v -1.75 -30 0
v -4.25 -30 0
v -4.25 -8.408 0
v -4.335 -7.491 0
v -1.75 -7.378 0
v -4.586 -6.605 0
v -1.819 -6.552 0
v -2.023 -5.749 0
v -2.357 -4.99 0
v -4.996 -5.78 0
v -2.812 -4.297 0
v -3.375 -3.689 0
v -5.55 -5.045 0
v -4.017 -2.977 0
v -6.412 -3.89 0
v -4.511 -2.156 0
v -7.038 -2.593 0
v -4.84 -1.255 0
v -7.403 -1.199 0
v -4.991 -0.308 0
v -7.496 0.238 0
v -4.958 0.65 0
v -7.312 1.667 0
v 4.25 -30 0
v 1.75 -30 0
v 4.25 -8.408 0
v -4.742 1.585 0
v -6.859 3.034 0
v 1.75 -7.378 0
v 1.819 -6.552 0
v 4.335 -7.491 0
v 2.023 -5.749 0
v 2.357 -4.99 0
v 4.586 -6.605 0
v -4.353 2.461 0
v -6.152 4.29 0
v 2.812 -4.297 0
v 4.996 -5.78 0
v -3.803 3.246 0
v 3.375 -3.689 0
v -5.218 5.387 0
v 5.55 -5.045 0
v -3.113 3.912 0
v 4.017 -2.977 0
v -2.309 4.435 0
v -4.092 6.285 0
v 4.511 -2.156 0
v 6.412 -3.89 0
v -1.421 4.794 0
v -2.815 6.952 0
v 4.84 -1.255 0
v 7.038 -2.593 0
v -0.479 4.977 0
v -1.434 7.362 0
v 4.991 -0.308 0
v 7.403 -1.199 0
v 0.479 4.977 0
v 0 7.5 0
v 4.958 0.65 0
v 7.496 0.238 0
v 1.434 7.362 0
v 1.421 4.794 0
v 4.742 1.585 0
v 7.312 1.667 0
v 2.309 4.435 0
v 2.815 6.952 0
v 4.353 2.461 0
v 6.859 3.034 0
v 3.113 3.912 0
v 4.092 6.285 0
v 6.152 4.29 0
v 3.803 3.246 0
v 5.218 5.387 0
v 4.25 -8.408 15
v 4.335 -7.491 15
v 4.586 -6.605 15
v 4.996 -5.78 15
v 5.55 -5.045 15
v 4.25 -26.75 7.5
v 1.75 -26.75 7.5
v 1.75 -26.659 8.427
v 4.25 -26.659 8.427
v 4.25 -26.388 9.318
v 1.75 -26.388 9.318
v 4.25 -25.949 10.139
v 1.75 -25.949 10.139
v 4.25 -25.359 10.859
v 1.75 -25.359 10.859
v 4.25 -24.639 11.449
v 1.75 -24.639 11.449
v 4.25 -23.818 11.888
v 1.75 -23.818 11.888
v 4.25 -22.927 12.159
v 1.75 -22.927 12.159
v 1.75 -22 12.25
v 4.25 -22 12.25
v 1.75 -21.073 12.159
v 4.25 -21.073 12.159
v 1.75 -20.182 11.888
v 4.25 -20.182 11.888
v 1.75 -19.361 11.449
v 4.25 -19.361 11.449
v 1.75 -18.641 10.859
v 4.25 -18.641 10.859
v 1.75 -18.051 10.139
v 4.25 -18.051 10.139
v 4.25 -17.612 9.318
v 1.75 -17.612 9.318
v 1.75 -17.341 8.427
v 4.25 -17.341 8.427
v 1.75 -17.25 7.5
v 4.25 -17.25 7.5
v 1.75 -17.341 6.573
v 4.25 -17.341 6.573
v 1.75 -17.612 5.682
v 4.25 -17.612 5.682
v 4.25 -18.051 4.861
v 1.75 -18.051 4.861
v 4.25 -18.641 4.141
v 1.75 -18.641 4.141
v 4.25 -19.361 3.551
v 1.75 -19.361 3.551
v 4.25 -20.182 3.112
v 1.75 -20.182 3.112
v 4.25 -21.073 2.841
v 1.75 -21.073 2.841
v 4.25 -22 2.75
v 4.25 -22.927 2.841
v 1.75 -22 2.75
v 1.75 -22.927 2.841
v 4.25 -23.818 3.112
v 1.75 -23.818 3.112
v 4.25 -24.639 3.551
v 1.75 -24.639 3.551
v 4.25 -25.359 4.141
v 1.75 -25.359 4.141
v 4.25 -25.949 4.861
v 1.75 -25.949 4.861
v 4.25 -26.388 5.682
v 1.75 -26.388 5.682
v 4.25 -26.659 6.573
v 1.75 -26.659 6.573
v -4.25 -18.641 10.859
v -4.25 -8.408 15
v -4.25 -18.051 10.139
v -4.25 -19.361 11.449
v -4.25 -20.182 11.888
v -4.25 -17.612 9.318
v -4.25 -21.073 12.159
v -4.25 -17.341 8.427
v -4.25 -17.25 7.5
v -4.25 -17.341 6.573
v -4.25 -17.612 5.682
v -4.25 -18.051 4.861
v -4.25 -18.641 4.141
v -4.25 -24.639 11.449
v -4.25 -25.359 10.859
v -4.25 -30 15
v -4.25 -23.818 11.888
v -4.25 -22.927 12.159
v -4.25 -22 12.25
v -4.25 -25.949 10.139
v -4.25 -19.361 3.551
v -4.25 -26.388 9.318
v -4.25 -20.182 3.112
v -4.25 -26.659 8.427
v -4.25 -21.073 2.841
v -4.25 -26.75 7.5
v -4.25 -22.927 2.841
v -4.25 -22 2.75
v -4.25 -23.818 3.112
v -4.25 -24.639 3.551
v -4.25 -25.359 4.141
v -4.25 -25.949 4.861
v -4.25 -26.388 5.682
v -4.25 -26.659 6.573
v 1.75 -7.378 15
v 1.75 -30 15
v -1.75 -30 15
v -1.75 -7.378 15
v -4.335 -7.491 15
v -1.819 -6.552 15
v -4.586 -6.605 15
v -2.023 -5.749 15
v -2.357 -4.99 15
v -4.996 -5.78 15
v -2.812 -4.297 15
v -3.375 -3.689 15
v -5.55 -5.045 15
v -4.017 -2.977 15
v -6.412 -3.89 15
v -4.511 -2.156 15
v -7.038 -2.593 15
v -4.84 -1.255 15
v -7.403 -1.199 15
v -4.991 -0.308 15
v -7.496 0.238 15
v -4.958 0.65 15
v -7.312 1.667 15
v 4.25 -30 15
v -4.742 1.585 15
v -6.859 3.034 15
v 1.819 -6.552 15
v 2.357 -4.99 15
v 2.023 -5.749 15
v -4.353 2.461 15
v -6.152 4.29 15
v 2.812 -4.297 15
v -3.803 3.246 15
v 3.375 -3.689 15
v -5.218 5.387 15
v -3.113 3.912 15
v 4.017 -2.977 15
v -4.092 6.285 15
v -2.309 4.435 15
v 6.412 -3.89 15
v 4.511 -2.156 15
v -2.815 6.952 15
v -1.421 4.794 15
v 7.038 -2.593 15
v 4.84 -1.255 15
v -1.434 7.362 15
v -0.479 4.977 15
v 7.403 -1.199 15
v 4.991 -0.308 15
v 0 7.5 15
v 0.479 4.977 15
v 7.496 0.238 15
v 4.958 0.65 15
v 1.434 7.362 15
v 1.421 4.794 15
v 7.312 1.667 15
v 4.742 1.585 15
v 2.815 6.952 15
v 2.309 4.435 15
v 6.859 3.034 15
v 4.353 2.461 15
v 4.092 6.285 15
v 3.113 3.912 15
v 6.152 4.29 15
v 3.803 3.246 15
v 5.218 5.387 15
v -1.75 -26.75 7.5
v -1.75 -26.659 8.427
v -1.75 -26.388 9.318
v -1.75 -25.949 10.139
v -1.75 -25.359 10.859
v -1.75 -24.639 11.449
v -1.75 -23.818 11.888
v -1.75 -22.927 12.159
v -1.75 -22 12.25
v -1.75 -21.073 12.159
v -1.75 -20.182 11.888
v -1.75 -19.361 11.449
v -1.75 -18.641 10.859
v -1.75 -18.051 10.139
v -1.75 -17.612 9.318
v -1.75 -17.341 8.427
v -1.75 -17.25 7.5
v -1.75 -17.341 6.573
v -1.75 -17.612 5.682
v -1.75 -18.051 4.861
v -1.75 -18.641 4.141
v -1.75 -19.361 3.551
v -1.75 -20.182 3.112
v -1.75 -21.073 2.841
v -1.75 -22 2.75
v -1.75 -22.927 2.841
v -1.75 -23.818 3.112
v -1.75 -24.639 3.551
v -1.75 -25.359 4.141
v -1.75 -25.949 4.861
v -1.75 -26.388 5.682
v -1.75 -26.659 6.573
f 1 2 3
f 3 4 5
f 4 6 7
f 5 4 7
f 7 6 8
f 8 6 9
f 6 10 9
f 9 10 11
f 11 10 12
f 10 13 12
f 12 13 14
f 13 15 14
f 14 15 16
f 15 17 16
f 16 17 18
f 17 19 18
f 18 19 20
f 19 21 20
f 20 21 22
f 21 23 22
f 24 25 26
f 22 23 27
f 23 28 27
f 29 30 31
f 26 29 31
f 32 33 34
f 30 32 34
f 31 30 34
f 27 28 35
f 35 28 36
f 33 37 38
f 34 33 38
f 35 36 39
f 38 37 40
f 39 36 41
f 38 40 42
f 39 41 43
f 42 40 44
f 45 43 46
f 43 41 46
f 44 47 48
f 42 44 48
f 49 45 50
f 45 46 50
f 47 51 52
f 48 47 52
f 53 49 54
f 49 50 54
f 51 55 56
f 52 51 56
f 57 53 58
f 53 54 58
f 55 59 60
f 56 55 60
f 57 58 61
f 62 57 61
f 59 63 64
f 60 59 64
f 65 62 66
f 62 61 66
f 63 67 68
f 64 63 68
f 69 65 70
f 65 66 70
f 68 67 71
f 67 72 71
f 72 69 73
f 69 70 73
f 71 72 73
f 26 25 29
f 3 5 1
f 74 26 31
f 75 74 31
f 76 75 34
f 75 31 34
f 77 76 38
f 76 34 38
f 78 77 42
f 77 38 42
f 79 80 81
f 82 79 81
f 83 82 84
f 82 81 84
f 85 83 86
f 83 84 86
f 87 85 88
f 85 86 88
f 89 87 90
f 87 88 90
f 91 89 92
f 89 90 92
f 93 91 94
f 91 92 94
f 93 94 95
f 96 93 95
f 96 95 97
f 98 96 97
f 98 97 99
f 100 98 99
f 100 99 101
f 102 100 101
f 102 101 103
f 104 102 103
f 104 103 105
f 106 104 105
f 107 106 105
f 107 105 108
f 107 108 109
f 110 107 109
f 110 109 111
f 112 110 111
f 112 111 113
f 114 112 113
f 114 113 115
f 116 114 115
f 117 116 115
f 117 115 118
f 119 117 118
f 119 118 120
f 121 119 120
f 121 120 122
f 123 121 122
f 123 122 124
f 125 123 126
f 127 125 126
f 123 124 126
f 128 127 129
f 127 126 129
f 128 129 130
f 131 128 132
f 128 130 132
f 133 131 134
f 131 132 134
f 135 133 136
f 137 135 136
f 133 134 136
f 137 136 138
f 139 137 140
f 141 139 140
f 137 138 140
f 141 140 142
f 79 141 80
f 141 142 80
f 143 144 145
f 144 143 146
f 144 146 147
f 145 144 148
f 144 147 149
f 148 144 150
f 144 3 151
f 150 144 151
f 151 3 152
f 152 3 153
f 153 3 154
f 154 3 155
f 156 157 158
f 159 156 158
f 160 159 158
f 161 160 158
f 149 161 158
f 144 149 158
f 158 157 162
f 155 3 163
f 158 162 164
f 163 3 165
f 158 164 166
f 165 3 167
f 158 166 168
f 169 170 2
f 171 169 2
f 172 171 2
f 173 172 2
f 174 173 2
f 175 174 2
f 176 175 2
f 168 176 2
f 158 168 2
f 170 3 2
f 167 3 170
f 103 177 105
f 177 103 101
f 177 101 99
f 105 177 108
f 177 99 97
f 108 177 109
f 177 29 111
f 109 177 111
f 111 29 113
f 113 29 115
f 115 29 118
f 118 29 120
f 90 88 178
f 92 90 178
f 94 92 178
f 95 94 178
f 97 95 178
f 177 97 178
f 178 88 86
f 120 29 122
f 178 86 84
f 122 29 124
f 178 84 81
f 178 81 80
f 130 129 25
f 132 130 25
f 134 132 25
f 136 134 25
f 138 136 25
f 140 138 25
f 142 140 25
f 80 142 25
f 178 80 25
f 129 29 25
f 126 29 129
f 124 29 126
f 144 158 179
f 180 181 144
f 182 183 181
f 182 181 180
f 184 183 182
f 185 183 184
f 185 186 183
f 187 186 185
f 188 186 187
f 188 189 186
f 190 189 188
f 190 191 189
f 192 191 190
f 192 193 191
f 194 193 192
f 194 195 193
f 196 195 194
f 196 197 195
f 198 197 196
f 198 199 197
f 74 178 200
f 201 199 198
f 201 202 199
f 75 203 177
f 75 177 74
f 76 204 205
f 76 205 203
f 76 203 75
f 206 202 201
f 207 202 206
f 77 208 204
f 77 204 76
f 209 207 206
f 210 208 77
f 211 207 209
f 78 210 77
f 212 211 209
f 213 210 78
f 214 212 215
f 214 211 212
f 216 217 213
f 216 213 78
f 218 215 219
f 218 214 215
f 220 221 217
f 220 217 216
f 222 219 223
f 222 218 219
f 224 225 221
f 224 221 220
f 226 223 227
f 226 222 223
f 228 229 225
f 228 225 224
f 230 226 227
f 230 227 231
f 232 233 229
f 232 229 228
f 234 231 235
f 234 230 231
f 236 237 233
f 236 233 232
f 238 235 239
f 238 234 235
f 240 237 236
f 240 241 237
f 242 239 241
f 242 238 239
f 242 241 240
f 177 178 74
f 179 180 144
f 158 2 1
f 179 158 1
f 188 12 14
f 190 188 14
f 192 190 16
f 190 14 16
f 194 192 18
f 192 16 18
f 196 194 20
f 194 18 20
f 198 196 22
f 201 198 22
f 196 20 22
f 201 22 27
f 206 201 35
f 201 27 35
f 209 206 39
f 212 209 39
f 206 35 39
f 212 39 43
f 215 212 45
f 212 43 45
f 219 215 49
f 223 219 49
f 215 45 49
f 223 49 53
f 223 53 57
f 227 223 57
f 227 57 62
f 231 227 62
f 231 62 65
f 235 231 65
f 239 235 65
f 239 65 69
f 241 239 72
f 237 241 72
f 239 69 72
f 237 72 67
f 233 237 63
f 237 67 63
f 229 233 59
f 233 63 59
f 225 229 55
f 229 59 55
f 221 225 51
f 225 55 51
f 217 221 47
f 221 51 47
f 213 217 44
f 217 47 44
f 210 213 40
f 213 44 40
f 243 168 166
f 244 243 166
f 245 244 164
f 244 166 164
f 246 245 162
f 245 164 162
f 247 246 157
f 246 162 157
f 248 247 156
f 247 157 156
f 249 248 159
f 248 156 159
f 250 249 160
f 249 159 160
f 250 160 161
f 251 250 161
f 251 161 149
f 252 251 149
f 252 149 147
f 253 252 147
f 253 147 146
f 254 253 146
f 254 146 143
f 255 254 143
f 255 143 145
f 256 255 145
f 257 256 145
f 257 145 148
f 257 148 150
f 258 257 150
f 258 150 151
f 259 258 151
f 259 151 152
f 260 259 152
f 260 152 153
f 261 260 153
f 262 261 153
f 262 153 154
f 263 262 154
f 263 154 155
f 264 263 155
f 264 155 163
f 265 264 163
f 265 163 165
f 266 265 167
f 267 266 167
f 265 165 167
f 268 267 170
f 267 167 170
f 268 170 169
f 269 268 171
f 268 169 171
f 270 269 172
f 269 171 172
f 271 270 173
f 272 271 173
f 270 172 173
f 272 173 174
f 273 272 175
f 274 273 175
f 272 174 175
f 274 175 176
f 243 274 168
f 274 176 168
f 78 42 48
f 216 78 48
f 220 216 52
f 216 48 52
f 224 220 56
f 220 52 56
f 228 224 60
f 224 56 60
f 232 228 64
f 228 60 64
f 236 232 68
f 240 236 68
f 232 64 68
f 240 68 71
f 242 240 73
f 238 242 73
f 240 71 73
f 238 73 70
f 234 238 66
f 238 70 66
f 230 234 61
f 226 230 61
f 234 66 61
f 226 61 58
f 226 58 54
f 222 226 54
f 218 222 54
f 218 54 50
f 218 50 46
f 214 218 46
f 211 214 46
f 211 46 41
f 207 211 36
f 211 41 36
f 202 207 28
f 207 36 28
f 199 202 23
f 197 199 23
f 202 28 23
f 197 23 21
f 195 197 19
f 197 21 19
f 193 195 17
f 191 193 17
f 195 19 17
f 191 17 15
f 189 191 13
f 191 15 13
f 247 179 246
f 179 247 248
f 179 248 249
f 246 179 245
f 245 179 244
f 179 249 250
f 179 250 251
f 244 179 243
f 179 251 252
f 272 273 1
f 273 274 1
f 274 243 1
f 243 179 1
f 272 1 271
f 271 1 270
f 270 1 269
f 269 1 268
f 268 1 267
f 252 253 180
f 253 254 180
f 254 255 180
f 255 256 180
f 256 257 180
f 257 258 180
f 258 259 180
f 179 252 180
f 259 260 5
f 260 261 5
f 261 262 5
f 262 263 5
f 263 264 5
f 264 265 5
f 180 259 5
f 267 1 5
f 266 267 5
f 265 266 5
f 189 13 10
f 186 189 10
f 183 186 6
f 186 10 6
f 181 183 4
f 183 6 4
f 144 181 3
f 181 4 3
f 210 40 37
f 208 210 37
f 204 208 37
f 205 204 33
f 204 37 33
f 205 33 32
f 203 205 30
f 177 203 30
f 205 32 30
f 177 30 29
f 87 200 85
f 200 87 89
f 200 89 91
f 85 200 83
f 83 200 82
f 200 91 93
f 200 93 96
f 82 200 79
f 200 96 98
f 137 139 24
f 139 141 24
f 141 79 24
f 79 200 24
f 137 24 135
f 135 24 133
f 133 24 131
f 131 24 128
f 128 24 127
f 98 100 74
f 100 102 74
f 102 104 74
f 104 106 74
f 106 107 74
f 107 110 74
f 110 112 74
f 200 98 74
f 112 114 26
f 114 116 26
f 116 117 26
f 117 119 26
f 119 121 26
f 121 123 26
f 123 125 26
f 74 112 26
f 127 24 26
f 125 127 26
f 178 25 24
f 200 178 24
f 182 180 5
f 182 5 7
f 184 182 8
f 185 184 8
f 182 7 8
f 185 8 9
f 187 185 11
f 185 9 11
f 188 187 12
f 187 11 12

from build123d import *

# Parameters (mm, degrees)
F1_DEPTH = 15
F3_D     = 9.5


with BuildPart() as f1:
    # F0 (on Top) → F1 (new body)
    with BuildSketch(Plane.XY):
        with BuildLine():
            ThreePointArc((-3.375, -3.689089), (0, 5), (3.375, -3.689089))
            ThreePointArc((3.375, -3.689089), (2.174249, -5.362613), (1.75, -7.378177))
            Line((1.75, -7.378177), (1.75, -30))
            Line((1.75, -30), (4.25, -30))
            Line((4.25, -30), (4.25, -8.407586))
            ThreePointArc((4.25, -8.407586), (4.58631, -6.60481), (5.55, -5.044552))
            ThreePointArc((5.55, -5.044552), (0, 7.5), (-5.55, -5.044552))
            ThreePointArc((-5.55, -5.044552), (-4.58631, -6.60481), (-4.25, -8.407586))
            Line((-4.25, -8.407586), (-4.25, -30))
            Line((-4.25, -30), (-1.75, -30))
            Line((-1.75, -30), (-1.75, -7.378177))
            ThreePointArc((-1.75, -7.378177), (-2.174249, -5.362613), (-3.375, -3.689089))
        make_face()
    extrude(amount=F1_DEPTH)

    # F3 (through all)
    with Locations(Plane.YZ.offset(4.25)):
        with Locations((-22, 7.5)):
            Hole(F3_D / 2)


solid = f1.part
